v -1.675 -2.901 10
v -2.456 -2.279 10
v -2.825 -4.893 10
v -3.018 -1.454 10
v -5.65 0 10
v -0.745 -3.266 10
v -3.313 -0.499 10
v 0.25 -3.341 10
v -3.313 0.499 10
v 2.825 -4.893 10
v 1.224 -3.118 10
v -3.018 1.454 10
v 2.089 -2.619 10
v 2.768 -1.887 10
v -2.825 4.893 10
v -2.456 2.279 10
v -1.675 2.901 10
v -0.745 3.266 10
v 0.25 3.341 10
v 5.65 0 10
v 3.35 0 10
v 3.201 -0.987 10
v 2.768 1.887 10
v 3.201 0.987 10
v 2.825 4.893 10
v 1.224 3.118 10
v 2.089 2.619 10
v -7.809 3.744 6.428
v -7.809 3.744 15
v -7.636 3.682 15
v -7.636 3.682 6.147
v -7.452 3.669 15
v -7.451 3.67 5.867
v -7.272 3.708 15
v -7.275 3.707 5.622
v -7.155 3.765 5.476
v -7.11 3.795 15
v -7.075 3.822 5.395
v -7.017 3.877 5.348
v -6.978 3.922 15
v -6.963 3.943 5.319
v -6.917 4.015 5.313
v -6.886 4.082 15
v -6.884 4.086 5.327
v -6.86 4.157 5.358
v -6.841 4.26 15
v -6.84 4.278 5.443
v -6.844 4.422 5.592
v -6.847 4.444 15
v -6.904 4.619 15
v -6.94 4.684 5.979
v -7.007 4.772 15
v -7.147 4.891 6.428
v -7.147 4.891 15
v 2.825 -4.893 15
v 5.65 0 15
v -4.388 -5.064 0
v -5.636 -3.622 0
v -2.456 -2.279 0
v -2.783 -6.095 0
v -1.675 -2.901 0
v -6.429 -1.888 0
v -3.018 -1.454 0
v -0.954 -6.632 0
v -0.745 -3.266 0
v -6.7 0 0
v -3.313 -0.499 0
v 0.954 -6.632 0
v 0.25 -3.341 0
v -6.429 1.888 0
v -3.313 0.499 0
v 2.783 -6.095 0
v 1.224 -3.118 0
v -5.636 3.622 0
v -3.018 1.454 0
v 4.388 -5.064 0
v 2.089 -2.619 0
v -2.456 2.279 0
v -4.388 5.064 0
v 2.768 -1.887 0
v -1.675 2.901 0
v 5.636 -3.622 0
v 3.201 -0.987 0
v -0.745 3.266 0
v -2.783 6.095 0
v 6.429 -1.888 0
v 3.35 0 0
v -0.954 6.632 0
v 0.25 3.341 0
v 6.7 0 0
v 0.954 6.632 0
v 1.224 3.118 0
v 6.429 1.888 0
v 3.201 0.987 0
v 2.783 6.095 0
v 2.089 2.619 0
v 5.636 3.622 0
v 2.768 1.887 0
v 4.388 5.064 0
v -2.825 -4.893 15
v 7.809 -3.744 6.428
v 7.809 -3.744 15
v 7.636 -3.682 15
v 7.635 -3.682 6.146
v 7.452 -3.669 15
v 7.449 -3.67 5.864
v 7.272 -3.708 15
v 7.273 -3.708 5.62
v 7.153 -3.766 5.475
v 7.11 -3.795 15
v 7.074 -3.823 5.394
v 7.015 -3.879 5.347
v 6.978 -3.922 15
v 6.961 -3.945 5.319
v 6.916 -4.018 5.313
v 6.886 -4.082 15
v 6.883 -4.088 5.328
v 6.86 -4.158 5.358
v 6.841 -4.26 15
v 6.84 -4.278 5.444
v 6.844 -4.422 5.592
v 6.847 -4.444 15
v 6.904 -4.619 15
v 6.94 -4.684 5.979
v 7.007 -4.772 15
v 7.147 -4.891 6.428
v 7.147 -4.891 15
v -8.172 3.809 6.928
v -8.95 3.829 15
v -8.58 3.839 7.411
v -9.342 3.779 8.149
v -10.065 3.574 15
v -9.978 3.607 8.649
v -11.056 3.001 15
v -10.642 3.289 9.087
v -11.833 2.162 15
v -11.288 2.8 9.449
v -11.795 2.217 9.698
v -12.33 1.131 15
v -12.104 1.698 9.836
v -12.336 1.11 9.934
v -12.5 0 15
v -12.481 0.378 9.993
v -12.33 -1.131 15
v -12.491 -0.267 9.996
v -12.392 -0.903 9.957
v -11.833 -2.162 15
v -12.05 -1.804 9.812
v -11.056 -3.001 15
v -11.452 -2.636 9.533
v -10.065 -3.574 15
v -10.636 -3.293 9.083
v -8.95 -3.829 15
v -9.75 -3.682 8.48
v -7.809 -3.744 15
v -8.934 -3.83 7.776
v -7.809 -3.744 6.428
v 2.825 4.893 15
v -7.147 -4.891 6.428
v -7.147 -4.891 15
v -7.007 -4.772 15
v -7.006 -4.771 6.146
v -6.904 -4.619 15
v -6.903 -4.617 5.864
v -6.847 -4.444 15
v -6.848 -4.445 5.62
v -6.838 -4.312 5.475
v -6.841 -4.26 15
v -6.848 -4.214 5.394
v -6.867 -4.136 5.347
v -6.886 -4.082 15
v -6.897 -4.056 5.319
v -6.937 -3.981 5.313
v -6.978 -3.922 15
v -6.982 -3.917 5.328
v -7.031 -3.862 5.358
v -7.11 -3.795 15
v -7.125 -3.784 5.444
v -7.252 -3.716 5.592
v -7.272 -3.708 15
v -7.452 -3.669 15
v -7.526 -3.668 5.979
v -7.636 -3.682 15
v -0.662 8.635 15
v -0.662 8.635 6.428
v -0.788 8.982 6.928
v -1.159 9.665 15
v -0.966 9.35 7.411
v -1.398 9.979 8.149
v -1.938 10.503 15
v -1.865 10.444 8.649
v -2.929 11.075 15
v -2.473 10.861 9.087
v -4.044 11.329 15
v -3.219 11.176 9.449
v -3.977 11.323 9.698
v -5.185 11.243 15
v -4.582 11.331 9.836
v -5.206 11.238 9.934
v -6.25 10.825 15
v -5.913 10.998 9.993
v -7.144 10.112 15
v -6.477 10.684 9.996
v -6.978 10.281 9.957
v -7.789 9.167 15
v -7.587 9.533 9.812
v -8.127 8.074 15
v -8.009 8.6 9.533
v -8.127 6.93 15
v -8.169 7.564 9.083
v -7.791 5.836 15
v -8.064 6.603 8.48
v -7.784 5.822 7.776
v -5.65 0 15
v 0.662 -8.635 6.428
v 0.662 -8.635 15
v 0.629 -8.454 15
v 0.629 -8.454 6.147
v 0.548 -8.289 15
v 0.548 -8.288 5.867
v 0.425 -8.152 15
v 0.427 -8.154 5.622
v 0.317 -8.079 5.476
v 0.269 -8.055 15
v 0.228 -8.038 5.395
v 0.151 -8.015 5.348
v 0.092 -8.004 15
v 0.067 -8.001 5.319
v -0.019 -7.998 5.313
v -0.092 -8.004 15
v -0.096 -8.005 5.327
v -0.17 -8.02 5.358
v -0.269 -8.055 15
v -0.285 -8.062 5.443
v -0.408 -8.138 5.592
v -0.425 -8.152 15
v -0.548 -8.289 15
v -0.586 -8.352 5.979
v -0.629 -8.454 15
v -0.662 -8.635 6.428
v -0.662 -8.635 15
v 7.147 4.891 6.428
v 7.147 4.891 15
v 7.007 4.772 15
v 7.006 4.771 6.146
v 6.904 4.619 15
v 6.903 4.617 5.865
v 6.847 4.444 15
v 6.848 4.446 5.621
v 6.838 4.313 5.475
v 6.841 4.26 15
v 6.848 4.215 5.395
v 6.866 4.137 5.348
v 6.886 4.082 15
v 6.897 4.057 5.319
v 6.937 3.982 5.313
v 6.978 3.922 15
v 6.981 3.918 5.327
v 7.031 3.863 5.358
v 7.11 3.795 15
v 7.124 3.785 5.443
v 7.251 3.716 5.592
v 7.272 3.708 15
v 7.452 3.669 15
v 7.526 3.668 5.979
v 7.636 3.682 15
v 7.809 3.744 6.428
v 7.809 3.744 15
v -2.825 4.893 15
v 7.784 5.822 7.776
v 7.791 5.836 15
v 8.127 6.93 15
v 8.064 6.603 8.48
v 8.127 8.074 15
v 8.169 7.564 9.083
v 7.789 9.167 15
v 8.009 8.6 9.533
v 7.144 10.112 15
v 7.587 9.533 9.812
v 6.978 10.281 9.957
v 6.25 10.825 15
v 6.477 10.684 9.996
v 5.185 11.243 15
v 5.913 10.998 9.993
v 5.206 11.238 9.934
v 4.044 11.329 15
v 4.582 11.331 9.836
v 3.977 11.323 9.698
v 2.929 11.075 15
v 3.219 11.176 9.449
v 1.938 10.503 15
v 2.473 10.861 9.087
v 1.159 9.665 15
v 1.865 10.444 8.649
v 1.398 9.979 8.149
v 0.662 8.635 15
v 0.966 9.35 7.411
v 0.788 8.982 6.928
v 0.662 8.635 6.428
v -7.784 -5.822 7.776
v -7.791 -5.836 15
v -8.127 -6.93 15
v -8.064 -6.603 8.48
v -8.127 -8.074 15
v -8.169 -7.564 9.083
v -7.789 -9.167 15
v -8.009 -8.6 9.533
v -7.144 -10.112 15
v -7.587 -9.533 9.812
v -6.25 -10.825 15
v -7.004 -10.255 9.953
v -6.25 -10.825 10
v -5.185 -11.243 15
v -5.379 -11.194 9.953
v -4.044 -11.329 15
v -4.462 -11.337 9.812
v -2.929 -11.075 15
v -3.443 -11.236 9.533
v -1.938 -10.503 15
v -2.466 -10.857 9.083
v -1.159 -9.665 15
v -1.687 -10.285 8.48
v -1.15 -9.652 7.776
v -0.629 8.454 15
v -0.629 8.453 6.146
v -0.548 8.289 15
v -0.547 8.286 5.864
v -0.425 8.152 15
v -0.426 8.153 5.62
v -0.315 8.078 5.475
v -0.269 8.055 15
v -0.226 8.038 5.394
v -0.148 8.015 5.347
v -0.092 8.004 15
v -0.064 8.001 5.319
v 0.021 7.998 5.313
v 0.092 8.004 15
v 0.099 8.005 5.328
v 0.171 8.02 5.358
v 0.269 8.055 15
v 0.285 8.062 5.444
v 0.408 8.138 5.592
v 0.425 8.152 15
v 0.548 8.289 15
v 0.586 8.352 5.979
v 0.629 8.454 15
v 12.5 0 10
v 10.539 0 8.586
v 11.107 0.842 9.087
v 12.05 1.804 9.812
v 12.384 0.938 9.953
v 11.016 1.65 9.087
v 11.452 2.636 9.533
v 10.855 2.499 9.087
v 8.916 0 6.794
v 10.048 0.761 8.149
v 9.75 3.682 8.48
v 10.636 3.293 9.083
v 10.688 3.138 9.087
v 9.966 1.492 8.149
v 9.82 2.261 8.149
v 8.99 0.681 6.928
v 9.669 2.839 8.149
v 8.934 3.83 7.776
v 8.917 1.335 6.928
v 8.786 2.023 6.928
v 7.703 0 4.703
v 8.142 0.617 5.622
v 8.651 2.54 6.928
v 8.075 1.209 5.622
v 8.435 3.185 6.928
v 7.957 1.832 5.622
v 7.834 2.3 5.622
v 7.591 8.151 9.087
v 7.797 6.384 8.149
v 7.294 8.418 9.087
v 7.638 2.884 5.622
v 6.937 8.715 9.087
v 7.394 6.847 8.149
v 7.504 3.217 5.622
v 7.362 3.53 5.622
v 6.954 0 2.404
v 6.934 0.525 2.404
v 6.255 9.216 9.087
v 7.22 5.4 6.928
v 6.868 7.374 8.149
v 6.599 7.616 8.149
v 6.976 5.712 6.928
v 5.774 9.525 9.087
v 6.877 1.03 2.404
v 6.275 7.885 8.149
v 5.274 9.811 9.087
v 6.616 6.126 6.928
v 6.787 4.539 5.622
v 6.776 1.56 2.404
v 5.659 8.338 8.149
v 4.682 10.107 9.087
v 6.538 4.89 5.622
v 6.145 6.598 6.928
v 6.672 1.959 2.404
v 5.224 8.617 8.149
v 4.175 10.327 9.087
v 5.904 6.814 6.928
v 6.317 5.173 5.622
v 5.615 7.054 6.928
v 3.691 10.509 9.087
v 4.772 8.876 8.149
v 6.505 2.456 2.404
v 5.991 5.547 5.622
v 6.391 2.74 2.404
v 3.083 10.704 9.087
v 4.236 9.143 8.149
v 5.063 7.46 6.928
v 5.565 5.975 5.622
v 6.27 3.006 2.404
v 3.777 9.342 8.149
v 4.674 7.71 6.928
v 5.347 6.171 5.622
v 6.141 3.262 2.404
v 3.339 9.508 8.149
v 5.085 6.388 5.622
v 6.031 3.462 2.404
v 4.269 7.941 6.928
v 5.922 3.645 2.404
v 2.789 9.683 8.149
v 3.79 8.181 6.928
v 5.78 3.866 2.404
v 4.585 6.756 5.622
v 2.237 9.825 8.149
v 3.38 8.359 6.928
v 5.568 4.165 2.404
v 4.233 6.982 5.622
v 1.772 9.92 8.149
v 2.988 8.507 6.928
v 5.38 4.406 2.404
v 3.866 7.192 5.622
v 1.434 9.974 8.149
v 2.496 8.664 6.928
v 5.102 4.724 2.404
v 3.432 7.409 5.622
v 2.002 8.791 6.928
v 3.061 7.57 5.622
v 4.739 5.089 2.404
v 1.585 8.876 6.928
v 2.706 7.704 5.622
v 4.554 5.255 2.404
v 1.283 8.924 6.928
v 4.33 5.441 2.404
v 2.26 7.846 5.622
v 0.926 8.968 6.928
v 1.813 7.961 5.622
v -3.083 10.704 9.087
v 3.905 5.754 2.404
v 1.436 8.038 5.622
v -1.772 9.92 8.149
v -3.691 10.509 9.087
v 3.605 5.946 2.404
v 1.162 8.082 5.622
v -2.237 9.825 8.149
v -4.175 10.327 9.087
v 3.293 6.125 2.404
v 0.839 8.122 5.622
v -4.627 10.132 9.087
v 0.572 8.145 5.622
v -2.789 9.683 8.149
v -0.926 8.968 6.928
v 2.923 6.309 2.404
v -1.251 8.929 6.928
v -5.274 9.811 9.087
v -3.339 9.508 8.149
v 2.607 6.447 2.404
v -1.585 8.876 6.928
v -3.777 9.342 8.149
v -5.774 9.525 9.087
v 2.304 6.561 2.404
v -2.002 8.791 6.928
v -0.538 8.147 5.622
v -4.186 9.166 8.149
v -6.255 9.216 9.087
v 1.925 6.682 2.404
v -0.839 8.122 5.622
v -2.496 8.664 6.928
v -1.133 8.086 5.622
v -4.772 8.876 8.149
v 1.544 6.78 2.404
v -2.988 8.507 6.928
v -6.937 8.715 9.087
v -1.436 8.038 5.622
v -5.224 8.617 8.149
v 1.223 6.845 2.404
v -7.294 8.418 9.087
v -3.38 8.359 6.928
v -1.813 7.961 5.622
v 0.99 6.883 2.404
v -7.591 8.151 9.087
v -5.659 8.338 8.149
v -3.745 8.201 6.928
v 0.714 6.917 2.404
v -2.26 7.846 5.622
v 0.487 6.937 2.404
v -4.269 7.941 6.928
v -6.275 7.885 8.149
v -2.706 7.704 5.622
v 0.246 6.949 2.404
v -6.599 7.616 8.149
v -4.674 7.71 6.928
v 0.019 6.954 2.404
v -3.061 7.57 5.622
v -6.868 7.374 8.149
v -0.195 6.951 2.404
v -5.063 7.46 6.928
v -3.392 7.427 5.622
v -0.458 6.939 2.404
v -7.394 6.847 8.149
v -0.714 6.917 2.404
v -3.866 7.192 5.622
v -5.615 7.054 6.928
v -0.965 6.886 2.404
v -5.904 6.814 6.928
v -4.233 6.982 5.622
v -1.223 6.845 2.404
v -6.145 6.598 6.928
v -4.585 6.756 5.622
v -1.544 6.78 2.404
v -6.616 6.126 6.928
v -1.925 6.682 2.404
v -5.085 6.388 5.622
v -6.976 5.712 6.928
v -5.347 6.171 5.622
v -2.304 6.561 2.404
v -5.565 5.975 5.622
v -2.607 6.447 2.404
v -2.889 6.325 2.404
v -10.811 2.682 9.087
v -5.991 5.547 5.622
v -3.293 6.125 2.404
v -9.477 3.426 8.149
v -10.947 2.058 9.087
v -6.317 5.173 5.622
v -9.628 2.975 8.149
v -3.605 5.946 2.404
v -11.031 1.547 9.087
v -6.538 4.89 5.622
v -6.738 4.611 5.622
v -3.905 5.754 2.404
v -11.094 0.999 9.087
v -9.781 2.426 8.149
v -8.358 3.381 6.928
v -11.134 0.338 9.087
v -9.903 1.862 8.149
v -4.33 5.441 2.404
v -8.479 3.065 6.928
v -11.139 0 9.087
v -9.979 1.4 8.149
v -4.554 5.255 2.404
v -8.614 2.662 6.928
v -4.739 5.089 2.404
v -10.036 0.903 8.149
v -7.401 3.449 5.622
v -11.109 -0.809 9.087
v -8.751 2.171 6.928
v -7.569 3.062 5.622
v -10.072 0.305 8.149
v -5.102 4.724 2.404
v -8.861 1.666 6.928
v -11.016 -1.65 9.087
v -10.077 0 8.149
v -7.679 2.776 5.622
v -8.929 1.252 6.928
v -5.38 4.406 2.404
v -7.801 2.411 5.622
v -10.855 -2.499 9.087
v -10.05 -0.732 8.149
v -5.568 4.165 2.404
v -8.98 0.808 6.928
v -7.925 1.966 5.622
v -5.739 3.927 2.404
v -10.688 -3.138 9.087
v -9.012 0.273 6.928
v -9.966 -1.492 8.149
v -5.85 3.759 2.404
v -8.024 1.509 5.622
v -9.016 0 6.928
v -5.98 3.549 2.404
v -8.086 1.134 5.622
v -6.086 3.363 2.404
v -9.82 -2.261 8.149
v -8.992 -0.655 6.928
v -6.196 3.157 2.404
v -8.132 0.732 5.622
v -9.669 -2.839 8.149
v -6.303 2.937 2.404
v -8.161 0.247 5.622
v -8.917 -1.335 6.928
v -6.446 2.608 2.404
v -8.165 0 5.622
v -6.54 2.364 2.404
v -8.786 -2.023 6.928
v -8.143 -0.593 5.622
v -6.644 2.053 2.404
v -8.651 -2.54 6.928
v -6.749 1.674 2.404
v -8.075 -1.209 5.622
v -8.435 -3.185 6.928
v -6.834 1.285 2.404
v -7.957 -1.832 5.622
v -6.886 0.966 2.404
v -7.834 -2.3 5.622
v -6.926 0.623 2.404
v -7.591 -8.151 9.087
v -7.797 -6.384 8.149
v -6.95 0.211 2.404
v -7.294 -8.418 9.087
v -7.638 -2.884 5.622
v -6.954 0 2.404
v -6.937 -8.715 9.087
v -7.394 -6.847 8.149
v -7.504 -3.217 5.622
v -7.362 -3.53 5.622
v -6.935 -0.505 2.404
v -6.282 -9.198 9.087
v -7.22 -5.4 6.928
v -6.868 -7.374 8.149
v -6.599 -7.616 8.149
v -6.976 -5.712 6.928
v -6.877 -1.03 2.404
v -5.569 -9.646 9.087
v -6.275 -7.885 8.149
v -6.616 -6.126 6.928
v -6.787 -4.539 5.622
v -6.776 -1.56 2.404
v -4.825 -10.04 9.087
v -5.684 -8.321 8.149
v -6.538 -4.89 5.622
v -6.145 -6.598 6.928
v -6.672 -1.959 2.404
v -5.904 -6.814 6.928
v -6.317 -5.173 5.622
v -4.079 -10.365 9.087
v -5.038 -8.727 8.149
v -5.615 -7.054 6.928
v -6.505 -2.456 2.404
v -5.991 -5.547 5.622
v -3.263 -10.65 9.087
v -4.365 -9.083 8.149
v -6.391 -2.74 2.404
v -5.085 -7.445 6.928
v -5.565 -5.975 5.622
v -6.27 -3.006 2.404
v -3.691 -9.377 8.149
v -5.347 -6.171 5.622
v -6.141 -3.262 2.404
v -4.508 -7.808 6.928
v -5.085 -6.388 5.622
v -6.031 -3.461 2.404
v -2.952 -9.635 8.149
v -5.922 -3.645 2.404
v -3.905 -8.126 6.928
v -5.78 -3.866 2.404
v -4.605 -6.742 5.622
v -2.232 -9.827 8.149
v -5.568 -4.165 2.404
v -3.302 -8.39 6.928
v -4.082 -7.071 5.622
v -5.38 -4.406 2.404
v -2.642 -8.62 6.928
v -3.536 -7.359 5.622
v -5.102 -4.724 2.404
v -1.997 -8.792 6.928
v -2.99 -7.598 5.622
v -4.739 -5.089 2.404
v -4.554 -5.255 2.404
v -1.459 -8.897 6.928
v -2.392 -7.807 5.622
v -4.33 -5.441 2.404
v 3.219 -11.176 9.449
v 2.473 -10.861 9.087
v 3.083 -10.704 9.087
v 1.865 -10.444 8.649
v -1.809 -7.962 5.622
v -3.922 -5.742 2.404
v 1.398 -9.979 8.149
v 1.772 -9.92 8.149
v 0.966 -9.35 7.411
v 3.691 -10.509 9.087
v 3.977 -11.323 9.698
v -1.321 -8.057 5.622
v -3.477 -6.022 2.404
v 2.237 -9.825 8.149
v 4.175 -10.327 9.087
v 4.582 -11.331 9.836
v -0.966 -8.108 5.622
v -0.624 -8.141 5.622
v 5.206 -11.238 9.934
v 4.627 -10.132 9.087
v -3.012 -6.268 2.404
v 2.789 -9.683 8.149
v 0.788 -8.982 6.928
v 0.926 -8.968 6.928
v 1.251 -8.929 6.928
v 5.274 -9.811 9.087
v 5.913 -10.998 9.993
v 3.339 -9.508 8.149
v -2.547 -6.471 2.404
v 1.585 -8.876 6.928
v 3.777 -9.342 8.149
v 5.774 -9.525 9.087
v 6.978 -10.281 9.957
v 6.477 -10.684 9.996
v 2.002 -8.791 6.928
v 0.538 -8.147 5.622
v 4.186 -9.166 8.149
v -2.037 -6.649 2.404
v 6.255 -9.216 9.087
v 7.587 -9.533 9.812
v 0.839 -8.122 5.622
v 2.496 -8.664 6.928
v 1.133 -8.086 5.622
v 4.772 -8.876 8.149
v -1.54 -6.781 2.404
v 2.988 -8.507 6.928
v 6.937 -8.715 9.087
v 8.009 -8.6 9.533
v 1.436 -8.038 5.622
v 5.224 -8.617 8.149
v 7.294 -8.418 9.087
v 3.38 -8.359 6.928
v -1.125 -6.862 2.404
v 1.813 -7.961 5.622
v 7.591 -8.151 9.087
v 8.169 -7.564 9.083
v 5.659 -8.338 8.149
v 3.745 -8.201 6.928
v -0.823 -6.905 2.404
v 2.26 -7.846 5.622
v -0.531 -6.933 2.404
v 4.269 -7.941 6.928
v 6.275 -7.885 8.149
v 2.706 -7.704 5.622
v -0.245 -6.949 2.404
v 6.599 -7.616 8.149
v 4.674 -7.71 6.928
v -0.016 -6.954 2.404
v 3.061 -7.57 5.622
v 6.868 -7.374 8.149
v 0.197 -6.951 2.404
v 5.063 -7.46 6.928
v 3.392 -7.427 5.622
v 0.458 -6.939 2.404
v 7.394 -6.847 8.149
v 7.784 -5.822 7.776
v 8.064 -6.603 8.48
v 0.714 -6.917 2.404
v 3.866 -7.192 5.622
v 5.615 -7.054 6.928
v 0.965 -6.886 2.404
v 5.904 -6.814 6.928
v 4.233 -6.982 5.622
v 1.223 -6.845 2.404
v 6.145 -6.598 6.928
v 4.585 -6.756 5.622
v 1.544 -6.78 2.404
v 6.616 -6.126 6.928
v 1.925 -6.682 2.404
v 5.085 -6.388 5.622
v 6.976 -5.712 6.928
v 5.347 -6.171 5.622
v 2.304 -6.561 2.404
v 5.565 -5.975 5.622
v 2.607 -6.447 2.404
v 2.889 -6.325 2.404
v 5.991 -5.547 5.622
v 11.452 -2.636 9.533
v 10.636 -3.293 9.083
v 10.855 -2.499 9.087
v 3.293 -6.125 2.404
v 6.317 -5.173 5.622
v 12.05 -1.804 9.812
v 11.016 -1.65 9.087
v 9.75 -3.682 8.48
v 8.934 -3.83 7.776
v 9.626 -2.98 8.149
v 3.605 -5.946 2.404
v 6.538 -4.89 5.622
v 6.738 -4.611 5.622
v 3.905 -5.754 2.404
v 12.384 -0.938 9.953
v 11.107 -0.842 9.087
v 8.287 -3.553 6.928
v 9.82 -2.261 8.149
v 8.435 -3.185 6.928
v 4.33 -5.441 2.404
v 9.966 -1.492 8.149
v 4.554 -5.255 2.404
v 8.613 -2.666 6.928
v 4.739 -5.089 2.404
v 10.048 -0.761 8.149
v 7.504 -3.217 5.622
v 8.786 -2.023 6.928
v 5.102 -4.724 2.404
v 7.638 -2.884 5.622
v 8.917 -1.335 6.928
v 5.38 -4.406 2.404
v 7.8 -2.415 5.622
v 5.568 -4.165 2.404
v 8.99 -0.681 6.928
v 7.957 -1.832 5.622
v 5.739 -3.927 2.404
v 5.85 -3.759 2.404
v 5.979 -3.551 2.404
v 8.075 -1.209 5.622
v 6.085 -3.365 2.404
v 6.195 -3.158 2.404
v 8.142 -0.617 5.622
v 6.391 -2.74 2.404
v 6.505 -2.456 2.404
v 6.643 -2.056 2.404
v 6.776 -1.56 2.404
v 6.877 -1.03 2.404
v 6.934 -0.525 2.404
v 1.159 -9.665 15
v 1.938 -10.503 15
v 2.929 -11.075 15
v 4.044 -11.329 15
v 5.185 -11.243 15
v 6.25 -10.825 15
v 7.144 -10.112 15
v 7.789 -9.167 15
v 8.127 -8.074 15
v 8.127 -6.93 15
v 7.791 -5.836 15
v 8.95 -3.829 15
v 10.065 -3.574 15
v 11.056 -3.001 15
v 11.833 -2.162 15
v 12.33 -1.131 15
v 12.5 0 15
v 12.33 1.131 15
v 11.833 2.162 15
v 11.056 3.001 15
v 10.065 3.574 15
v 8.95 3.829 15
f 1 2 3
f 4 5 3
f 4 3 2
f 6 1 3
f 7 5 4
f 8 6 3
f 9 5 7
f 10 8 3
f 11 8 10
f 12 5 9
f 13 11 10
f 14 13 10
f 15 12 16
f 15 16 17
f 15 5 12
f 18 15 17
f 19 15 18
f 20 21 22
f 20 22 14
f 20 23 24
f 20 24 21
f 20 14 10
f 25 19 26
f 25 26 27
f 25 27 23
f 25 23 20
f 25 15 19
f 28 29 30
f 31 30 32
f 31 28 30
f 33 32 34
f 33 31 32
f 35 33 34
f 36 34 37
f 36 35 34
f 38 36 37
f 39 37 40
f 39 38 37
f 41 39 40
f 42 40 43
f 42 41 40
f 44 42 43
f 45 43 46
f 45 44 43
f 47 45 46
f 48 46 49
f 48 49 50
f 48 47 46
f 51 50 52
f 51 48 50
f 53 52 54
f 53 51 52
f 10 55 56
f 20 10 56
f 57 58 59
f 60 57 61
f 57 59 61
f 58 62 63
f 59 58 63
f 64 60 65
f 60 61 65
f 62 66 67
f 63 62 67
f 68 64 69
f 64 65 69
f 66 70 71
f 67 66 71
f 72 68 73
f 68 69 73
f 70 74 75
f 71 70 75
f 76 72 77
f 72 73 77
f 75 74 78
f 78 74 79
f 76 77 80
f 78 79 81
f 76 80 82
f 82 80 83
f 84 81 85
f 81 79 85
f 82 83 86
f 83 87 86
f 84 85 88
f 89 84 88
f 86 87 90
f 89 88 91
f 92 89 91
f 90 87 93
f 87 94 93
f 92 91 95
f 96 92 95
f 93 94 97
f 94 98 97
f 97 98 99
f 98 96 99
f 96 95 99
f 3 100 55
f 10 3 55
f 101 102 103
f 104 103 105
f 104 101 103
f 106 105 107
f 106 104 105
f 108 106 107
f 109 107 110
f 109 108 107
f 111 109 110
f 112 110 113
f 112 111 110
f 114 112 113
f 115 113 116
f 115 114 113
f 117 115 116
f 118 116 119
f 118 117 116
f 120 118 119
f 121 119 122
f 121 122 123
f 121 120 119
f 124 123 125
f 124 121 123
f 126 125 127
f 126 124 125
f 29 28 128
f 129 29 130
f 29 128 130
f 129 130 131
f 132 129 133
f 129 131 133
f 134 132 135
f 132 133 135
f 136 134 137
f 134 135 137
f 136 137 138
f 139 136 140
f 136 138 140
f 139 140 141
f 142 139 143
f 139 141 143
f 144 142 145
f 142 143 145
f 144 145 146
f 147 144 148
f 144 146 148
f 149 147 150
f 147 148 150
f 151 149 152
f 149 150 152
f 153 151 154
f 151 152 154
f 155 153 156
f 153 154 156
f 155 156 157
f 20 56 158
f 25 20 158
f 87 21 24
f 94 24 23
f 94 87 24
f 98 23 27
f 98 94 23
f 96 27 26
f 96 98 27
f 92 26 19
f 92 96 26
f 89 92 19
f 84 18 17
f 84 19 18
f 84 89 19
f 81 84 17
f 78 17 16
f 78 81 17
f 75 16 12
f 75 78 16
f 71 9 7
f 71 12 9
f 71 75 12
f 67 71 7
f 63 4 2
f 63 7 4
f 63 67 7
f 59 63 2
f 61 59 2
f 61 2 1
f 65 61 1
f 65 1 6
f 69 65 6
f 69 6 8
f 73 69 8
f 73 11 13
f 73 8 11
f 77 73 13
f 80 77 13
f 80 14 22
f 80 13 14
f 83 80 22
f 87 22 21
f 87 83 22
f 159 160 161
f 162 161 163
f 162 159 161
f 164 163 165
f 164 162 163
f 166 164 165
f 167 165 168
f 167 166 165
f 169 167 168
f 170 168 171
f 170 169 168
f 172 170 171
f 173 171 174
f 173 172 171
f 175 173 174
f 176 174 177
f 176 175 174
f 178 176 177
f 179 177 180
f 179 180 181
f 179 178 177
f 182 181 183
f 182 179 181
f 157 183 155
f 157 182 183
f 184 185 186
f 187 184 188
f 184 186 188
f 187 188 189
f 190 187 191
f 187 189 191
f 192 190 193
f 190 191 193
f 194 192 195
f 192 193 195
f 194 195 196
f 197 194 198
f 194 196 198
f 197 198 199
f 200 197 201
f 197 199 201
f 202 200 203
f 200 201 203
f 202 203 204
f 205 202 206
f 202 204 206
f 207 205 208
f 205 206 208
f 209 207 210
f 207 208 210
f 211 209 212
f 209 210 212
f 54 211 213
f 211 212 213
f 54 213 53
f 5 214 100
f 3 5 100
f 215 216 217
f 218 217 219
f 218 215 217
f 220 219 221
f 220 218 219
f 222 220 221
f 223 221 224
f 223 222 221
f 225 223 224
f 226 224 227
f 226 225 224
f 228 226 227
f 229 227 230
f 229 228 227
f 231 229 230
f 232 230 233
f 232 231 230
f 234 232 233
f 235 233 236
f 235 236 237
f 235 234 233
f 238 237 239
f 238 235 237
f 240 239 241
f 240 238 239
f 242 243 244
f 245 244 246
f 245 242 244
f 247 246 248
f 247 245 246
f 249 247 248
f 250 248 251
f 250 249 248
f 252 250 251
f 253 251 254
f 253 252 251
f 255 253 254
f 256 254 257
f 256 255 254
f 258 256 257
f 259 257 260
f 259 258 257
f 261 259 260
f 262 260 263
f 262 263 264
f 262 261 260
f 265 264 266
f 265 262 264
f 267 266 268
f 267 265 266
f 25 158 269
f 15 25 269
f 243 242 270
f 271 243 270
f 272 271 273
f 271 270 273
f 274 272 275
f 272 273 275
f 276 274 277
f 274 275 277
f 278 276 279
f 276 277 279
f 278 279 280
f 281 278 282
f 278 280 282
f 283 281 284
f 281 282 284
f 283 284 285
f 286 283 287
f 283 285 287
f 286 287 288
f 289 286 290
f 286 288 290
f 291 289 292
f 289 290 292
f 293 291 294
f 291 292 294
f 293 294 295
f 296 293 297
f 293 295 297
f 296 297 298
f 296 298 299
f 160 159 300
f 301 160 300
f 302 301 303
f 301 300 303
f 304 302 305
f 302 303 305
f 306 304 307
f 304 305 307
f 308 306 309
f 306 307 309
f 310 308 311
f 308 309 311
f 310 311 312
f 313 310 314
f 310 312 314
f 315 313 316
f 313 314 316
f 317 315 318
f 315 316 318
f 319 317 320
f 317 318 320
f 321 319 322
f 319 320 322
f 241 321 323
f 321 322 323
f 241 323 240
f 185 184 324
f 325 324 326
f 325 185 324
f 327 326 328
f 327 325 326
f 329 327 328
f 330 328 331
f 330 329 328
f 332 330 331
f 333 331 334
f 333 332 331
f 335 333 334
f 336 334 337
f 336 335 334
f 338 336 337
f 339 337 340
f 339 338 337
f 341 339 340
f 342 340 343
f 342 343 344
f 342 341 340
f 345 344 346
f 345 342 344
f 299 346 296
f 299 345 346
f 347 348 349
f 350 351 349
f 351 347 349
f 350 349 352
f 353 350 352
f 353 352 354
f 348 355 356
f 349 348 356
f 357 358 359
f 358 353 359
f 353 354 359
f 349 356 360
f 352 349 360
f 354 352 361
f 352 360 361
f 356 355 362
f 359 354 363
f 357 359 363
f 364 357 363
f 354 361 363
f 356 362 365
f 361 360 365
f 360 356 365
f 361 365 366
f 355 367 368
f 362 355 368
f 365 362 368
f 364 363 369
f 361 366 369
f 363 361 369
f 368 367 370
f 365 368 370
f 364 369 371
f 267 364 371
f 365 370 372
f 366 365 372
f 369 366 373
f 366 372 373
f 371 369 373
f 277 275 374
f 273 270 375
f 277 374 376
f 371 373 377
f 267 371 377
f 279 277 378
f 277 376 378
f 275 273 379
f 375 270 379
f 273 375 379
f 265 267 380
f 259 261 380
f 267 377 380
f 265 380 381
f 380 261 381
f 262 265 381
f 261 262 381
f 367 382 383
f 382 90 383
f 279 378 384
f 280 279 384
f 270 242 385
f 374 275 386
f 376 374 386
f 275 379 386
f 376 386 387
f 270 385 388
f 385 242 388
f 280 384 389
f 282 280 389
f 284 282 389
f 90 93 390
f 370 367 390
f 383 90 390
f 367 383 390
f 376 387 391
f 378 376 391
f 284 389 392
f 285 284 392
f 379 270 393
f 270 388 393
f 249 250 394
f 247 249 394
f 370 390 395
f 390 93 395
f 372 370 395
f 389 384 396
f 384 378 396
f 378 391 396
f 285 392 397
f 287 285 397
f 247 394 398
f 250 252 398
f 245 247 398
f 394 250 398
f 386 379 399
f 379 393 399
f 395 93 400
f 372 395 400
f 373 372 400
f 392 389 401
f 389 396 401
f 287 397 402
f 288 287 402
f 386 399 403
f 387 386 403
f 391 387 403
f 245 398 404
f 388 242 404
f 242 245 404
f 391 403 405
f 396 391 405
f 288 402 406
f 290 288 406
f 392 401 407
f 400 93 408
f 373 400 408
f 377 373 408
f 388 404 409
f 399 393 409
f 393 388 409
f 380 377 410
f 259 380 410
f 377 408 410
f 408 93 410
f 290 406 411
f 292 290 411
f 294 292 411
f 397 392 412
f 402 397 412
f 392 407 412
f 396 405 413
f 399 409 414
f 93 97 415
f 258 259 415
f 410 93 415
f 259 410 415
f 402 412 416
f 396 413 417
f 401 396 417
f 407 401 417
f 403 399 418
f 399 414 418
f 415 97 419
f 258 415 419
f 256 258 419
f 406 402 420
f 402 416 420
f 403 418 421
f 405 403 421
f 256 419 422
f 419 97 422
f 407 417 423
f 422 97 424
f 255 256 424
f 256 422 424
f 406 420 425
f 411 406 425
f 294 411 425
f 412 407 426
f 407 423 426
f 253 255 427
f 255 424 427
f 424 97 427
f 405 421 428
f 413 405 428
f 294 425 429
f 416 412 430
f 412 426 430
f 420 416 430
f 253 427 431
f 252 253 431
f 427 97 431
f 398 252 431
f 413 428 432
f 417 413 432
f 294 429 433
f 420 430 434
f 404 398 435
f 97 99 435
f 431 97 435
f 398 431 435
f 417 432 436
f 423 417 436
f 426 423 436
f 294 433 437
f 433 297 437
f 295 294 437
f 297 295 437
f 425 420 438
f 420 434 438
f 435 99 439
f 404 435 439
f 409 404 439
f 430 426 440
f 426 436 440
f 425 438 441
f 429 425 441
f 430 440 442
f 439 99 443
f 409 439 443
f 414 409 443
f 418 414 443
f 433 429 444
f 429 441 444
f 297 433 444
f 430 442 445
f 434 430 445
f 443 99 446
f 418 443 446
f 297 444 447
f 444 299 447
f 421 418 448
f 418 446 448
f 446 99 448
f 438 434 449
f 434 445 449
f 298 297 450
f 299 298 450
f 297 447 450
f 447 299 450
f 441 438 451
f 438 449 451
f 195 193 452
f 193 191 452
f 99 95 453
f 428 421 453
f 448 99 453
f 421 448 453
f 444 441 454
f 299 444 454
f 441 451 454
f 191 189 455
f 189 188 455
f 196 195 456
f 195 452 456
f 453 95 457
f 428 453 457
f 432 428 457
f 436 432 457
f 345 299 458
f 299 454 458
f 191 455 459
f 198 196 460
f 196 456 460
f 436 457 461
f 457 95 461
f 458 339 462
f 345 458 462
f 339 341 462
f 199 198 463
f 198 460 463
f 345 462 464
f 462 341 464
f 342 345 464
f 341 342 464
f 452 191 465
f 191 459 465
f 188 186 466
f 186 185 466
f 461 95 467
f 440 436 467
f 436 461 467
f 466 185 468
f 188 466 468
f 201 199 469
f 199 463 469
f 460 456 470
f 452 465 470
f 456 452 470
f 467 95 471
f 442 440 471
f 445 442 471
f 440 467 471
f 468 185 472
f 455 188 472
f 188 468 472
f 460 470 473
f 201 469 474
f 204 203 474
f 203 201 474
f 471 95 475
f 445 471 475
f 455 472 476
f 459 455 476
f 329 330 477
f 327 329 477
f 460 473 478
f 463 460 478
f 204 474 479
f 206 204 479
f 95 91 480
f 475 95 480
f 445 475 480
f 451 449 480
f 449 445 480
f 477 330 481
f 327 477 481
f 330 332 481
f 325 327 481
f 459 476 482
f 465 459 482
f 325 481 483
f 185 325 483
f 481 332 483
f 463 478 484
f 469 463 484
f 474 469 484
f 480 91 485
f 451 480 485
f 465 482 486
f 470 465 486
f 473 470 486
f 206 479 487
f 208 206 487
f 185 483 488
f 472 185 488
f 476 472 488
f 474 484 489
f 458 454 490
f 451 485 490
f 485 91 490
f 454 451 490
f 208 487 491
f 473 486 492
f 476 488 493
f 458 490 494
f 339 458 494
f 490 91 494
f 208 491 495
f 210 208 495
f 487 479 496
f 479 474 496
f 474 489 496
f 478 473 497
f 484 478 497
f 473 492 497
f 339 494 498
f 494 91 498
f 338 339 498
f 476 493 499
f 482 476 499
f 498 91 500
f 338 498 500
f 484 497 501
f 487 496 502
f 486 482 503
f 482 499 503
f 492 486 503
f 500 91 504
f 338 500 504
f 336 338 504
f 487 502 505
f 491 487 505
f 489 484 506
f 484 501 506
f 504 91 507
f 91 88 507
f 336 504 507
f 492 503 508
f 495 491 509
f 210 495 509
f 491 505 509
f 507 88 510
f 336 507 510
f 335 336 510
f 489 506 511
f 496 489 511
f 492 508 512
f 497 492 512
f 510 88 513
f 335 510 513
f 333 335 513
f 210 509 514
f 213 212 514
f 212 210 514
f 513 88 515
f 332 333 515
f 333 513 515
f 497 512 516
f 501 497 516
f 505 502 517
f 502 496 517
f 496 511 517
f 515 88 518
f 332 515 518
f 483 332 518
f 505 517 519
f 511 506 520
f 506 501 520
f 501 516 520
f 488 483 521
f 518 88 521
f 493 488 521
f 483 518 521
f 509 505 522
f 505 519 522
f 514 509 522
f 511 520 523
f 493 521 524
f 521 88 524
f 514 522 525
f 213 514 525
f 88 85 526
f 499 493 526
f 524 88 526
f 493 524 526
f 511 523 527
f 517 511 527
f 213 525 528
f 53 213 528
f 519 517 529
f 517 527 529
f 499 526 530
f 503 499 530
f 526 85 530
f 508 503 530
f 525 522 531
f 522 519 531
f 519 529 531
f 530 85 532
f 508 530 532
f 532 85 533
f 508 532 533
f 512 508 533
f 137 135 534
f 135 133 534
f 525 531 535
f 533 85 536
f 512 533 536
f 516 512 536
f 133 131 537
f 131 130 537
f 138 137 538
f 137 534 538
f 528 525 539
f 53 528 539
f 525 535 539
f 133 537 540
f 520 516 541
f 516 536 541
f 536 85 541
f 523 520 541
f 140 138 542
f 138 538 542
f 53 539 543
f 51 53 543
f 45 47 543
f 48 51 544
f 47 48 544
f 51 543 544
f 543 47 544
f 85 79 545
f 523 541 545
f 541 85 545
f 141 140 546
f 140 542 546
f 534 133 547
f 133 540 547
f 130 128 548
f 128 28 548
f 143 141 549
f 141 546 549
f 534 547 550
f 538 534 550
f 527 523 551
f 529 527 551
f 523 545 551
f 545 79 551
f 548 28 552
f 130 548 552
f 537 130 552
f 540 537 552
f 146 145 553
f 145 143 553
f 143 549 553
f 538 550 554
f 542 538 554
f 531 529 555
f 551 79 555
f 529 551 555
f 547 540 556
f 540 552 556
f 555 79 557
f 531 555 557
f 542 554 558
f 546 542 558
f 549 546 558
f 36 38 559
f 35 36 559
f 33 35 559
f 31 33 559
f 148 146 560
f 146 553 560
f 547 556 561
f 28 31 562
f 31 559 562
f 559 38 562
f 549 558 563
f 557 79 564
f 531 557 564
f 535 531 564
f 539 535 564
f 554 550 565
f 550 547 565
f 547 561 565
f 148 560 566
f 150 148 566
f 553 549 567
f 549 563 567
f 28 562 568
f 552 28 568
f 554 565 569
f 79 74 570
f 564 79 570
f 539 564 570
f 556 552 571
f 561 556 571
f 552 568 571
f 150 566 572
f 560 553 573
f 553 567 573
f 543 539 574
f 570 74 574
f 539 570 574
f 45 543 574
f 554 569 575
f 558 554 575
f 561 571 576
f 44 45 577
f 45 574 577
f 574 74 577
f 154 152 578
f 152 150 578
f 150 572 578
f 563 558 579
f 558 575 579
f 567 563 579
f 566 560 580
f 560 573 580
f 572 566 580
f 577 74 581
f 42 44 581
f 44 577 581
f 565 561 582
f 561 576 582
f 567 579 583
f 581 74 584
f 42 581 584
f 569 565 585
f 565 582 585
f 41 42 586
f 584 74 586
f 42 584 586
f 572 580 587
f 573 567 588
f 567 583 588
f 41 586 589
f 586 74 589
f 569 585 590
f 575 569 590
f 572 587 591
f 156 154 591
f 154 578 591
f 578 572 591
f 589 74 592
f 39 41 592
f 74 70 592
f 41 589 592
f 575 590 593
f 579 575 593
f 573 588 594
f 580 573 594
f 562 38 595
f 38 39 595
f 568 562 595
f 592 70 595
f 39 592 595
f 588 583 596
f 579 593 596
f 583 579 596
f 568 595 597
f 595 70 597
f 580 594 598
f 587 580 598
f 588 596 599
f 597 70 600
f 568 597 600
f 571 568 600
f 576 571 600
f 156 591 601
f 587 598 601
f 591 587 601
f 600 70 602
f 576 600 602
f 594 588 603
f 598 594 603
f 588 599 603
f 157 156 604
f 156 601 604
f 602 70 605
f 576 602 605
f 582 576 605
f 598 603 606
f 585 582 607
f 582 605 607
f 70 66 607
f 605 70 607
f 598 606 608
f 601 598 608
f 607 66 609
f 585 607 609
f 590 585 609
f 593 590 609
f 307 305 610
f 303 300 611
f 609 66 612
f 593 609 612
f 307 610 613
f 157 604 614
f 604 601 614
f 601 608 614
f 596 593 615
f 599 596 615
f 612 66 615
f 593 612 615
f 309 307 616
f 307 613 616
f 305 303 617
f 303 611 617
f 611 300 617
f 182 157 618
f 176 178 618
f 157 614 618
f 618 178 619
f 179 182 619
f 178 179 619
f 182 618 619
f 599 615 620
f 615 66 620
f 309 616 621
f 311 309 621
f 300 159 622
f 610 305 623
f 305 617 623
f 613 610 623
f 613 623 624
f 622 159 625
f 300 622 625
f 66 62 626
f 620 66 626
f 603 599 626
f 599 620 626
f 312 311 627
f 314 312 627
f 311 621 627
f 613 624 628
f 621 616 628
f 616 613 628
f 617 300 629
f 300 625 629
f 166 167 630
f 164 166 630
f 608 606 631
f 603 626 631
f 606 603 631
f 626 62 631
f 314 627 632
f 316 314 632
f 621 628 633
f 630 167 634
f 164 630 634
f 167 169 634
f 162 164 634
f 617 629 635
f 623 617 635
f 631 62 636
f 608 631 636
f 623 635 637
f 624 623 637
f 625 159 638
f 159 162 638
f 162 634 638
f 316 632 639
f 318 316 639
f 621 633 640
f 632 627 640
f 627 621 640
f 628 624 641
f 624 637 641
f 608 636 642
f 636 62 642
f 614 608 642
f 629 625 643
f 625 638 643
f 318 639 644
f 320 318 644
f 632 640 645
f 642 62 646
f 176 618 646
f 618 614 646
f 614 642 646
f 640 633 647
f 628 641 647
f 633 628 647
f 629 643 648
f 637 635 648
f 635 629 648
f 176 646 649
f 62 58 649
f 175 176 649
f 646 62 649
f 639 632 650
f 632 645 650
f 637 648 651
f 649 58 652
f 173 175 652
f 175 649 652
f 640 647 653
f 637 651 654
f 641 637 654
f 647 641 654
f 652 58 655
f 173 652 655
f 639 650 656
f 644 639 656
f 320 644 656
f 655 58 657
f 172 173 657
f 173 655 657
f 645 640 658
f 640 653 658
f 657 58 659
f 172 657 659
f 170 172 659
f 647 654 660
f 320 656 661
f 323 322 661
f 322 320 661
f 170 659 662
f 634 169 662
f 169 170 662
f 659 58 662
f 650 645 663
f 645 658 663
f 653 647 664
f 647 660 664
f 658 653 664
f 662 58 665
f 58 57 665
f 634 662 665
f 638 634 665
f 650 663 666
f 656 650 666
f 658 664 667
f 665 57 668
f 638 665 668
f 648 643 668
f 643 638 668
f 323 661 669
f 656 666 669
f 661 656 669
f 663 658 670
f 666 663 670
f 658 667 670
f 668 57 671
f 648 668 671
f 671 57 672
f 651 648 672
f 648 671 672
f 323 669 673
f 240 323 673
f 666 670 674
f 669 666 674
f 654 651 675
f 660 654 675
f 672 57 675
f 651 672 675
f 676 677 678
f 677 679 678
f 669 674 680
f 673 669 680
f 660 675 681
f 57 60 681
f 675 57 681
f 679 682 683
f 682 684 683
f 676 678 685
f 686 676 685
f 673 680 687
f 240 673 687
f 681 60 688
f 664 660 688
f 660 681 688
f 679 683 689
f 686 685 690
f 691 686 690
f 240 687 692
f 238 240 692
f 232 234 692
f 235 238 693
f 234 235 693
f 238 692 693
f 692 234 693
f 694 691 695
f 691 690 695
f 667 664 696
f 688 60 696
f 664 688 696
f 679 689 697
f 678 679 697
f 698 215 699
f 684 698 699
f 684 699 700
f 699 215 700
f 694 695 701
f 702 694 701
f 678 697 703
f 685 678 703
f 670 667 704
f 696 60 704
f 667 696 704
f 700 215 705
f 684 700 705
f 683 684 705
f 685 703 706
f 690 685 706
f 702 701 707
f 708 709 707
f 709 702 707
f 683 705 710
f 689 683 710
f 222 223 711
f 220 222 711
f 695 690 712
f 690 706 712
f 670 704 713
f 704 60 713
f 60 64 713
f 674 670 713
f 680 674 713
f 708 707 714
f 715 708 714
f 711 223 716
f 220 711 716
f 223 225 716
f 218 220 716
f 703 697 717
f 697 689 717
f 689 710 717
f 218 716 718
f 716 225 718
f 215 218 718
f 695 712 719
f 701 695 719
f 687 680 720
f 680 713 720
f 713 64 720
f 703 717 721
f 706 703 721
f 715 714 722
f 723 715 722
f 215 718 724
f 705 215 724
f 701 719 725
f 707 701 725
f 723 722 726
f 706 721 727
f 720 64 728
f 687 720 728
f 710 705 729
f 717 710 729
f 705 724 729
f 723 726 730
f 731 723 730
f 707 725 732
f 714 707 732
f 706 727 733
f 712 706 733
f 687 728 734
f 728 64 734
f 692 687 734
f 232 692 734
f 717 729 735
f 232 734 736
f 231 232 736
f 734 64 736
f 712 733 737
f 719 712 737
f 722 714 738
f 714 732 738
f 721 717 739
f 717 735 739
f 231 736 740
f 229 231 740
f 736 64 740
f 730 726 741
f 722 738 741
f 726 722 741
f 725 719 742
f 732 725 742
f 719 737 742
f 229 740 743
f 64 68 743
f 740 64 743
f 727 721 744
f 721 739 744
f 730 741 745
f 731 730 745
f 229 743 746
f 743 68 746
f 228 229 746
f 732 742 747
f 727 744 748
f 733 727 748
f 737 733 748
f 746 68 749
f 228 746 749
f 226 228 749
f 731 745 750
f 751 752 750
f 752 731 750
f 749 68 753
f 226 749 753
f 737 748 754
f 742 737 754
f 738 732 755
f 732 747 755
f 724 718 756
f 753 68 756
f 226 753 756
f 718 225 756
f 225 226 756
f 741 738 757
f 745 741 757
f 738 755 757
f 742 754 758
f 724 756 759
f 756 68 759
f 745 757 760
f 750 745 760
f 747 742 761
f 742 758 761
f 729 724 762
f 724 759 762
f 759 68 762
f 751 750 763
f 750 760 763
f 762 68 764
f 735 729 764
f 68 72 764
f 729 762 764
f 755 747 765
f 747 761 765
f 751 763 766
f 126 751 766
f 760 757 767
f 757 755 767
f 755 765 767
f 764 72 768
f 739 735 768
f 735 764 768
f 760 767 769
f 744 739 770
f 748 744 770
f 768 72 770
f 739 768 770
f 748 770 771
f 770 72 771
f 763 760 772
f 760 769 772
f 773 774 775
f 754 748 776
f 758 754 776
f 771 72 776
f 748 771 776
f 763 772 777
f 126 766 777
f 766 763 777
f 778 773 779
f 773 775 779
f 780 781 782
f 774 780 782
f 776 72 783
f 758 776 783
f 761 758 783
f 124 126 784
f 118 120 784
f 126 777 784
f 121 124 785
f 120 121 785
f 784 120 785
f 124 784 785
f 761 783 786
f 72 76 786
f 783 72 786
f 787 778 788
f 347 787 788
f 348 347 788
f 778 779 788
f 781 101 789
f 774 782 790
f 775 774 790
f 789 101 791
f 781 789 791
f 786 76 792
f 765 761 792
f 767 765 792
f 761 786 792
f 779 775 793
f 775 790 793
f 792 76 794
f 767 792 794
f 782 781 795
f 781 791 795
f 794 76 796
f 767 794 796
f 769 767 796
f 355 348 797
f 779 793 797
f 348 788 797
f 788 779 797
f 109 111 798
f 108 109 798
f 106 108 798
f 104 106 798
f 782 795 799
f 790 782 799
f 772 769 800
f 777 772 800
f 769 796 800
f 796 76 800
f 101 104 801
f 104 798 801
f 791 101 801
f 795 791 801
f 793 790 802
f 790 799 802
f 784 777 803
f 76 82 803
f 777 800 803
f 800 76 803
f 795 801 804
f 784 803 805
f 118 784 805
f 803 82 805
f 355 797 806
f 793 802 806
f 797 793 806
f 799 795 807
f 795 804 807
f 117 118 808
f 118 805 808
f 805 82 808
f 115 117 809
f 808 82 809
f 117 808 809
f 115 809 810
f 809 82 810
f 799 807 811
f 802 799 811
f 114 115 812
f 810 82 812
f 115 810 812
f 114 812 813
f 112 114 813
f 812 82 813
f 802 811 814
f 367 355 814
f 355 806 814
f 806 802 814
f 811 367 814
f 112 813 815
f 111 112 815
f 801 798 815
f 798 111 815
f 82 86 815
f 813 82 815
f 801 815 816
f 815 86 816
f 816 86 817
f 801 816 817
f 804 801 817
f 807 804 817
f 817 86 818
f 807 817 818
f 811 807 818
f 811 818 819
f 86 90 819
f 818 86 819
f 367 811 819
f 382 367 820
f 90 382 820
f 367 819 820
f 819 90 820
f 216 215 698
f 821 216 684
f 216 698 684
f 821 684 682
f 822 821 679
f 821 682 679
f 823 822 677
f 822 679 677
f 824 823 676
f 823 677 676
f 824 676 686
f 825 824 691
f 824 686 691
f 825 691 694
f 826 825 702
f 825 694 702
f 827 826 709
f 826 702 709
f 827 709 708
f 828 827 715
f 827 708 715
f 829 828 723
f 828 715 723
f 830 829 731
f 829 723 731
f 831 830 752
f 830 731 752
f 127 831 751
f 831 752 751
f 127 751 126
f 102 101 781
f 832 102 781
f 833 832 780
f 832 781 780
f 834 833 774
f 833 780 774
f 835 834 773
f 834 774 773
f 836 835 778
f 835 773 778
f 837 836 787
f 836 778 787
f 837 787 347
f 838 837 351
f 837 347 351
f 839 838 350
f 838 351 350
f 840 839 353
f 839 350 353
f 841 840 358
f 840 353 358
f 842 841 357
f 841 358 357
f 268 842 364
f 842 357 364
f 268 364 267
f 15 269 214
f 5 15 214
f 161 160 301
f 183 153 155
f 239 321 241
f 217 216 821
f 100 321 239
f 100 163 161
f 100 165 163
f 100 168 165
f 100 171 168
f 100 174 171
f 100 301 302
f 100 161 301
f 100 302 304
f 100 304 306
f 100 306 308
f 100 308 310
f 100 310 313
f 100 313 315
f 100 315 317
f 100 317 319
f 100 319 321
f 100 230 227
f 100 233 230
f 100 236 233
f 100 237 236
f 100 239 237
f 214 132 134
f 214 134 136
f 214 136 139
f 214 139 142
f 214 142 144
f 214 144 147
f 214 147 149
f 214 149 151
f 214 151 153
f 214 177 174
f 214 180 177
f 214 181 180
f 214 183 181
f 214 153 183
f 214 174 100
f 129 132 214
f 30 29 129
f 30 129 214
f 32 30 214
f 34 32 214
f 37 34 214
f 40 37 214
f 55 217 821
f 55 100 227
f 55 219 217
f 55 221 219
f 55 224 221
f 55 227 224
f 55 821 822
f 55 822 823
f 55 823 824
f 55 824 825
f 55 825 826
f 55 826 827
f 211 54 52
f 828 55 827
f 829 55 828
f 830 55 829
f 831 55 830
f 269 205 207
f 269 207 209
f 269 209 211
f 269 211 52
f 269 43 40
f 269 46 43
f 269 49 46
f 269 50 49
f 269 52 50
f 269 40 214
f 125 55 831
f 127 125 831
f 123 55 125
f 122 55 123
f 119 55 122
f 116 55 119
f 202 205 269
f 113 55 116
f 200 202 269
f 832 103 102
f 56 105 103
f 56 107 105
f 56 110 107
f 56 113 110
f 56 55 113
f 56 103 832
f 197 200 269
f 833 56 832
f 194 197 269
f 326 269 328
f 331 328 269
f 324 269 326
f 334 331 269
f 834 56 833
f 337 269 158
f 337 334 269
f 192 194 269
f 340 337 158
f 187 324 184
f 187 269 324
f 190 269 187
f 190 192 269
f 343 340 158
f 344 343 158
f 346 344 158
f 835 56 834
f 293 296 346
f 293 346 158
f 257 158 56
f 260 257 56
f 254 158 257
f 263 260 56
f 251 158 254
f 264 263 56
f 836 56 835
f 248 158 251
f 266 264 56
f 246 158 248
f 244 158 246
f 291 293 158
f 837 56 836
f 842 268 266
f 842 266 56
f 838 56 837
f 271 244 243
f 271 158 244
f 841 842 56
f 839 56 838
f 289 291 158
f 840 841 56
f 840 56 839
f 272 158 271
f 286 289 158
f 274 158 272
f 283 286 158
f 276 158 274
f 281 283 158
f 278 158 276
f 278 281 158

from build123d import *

# Parameters (mm, degrees)
SKETCH008_R     = 3.35
PAD004_DEPTH    = 15
POCKET002_DEPTH = 5


with BuildPart() as part:
    # Sketch008 → Pad004 (new body)
    with BuildSketch(Plane.XY):
        with BuildLine():
            ThreePointArc((7.1470904861, 4.890715447), (6.25, 10.8253175473), (0.6619385767, 8.6349196476))
            ThreePointArc((-0.6619385767, 8.6349196476), (0, 7.9978308267), (0.6619385767, 8.6349196476))
            ThreePointArc((-0.6619385767, 8.6349196476), (-6.25, 10.8253175473), (-7.1470904861, 4.890715447))
            ThreePointArc((-7.8090290628, 3.7442042006), (-6.9263246711, 3.9989154133), (-7.1470904861, 4.890715447))
            ThreePointArc((-7.8090290628, 3.7442042006), (-12.5, 0), (-7.8090290628, -3.7442042006))
            ThreePointArc((-7.1470904861, -4.890715447), (-6.9263246711, -3.9989154133), (-7.8090290628, -3.7442042006))
            ThreePointArc((-7.1470904861, -4.890715447), (-6.25, -10.8253175473), (-0.6619385767, -8.6349196476))
            ThreePointArc((0.6619385767, -8.6349196476), (0, -7.9978308267), (-0.6619385767, -8.6349196476))
            ThreePointArc((0.6619385767, -8.6349196476), (6.25, -10.8253175473), (7.1470904861, -4.890715447))
            ThreePointArc((7.8090290628, -3.7442042006), (6.9263246711, -3.9989154133), (7.1470904861, -4.890715447))
            ThreePointArc((7.8090290628, -3.7442042006), (12.5, 0), (7.8090290628, 3.7442042006))
            ThreePointArc((7.1470904861, 4.890715447), (6.9263246711, 3.9989154133), (7.8090290628, 3.7442042006))
        make_face()
        Circle(SKETCH008_R, mode=Mode.SUBTRACT)
    extrude(amount=PAD004_DEPTH)

    # Sketch009 (on Face15 of Pad004) → Pocket002 (cut)
    with BuildSketch(Plane.XY.offset(15)):
        Polygon((2.825, -4.8930435314), (5.65, 0), (2.825, 4.8930435314), (-2.825, 4.8930435314), (-5.65, 0), (-2.825, -4.8930435314), align=None)
    extrude(amount=-POCKET002_DEPTH, mode=Mode.SUBTRACT)

    # Sketch010 → Groove (revolve, cut)
    with BuildSketch(Plane.XZ):
        with BuildLine():
            ThreePointArc((12.5, 10), (8.2549337817, 5.7801384066), (6.7, 0))
            Line((6.7, 0), (13.5, 0))
            Line((13.5, 0), (13.5, 10))
            Line((13.5, 10), (12.5, 10))
        make_face()
    revolve(axis=Axis((0, 0, 0), (0, 0, 1)), mode=Mode.SUBTRACT)


solid = part.part
